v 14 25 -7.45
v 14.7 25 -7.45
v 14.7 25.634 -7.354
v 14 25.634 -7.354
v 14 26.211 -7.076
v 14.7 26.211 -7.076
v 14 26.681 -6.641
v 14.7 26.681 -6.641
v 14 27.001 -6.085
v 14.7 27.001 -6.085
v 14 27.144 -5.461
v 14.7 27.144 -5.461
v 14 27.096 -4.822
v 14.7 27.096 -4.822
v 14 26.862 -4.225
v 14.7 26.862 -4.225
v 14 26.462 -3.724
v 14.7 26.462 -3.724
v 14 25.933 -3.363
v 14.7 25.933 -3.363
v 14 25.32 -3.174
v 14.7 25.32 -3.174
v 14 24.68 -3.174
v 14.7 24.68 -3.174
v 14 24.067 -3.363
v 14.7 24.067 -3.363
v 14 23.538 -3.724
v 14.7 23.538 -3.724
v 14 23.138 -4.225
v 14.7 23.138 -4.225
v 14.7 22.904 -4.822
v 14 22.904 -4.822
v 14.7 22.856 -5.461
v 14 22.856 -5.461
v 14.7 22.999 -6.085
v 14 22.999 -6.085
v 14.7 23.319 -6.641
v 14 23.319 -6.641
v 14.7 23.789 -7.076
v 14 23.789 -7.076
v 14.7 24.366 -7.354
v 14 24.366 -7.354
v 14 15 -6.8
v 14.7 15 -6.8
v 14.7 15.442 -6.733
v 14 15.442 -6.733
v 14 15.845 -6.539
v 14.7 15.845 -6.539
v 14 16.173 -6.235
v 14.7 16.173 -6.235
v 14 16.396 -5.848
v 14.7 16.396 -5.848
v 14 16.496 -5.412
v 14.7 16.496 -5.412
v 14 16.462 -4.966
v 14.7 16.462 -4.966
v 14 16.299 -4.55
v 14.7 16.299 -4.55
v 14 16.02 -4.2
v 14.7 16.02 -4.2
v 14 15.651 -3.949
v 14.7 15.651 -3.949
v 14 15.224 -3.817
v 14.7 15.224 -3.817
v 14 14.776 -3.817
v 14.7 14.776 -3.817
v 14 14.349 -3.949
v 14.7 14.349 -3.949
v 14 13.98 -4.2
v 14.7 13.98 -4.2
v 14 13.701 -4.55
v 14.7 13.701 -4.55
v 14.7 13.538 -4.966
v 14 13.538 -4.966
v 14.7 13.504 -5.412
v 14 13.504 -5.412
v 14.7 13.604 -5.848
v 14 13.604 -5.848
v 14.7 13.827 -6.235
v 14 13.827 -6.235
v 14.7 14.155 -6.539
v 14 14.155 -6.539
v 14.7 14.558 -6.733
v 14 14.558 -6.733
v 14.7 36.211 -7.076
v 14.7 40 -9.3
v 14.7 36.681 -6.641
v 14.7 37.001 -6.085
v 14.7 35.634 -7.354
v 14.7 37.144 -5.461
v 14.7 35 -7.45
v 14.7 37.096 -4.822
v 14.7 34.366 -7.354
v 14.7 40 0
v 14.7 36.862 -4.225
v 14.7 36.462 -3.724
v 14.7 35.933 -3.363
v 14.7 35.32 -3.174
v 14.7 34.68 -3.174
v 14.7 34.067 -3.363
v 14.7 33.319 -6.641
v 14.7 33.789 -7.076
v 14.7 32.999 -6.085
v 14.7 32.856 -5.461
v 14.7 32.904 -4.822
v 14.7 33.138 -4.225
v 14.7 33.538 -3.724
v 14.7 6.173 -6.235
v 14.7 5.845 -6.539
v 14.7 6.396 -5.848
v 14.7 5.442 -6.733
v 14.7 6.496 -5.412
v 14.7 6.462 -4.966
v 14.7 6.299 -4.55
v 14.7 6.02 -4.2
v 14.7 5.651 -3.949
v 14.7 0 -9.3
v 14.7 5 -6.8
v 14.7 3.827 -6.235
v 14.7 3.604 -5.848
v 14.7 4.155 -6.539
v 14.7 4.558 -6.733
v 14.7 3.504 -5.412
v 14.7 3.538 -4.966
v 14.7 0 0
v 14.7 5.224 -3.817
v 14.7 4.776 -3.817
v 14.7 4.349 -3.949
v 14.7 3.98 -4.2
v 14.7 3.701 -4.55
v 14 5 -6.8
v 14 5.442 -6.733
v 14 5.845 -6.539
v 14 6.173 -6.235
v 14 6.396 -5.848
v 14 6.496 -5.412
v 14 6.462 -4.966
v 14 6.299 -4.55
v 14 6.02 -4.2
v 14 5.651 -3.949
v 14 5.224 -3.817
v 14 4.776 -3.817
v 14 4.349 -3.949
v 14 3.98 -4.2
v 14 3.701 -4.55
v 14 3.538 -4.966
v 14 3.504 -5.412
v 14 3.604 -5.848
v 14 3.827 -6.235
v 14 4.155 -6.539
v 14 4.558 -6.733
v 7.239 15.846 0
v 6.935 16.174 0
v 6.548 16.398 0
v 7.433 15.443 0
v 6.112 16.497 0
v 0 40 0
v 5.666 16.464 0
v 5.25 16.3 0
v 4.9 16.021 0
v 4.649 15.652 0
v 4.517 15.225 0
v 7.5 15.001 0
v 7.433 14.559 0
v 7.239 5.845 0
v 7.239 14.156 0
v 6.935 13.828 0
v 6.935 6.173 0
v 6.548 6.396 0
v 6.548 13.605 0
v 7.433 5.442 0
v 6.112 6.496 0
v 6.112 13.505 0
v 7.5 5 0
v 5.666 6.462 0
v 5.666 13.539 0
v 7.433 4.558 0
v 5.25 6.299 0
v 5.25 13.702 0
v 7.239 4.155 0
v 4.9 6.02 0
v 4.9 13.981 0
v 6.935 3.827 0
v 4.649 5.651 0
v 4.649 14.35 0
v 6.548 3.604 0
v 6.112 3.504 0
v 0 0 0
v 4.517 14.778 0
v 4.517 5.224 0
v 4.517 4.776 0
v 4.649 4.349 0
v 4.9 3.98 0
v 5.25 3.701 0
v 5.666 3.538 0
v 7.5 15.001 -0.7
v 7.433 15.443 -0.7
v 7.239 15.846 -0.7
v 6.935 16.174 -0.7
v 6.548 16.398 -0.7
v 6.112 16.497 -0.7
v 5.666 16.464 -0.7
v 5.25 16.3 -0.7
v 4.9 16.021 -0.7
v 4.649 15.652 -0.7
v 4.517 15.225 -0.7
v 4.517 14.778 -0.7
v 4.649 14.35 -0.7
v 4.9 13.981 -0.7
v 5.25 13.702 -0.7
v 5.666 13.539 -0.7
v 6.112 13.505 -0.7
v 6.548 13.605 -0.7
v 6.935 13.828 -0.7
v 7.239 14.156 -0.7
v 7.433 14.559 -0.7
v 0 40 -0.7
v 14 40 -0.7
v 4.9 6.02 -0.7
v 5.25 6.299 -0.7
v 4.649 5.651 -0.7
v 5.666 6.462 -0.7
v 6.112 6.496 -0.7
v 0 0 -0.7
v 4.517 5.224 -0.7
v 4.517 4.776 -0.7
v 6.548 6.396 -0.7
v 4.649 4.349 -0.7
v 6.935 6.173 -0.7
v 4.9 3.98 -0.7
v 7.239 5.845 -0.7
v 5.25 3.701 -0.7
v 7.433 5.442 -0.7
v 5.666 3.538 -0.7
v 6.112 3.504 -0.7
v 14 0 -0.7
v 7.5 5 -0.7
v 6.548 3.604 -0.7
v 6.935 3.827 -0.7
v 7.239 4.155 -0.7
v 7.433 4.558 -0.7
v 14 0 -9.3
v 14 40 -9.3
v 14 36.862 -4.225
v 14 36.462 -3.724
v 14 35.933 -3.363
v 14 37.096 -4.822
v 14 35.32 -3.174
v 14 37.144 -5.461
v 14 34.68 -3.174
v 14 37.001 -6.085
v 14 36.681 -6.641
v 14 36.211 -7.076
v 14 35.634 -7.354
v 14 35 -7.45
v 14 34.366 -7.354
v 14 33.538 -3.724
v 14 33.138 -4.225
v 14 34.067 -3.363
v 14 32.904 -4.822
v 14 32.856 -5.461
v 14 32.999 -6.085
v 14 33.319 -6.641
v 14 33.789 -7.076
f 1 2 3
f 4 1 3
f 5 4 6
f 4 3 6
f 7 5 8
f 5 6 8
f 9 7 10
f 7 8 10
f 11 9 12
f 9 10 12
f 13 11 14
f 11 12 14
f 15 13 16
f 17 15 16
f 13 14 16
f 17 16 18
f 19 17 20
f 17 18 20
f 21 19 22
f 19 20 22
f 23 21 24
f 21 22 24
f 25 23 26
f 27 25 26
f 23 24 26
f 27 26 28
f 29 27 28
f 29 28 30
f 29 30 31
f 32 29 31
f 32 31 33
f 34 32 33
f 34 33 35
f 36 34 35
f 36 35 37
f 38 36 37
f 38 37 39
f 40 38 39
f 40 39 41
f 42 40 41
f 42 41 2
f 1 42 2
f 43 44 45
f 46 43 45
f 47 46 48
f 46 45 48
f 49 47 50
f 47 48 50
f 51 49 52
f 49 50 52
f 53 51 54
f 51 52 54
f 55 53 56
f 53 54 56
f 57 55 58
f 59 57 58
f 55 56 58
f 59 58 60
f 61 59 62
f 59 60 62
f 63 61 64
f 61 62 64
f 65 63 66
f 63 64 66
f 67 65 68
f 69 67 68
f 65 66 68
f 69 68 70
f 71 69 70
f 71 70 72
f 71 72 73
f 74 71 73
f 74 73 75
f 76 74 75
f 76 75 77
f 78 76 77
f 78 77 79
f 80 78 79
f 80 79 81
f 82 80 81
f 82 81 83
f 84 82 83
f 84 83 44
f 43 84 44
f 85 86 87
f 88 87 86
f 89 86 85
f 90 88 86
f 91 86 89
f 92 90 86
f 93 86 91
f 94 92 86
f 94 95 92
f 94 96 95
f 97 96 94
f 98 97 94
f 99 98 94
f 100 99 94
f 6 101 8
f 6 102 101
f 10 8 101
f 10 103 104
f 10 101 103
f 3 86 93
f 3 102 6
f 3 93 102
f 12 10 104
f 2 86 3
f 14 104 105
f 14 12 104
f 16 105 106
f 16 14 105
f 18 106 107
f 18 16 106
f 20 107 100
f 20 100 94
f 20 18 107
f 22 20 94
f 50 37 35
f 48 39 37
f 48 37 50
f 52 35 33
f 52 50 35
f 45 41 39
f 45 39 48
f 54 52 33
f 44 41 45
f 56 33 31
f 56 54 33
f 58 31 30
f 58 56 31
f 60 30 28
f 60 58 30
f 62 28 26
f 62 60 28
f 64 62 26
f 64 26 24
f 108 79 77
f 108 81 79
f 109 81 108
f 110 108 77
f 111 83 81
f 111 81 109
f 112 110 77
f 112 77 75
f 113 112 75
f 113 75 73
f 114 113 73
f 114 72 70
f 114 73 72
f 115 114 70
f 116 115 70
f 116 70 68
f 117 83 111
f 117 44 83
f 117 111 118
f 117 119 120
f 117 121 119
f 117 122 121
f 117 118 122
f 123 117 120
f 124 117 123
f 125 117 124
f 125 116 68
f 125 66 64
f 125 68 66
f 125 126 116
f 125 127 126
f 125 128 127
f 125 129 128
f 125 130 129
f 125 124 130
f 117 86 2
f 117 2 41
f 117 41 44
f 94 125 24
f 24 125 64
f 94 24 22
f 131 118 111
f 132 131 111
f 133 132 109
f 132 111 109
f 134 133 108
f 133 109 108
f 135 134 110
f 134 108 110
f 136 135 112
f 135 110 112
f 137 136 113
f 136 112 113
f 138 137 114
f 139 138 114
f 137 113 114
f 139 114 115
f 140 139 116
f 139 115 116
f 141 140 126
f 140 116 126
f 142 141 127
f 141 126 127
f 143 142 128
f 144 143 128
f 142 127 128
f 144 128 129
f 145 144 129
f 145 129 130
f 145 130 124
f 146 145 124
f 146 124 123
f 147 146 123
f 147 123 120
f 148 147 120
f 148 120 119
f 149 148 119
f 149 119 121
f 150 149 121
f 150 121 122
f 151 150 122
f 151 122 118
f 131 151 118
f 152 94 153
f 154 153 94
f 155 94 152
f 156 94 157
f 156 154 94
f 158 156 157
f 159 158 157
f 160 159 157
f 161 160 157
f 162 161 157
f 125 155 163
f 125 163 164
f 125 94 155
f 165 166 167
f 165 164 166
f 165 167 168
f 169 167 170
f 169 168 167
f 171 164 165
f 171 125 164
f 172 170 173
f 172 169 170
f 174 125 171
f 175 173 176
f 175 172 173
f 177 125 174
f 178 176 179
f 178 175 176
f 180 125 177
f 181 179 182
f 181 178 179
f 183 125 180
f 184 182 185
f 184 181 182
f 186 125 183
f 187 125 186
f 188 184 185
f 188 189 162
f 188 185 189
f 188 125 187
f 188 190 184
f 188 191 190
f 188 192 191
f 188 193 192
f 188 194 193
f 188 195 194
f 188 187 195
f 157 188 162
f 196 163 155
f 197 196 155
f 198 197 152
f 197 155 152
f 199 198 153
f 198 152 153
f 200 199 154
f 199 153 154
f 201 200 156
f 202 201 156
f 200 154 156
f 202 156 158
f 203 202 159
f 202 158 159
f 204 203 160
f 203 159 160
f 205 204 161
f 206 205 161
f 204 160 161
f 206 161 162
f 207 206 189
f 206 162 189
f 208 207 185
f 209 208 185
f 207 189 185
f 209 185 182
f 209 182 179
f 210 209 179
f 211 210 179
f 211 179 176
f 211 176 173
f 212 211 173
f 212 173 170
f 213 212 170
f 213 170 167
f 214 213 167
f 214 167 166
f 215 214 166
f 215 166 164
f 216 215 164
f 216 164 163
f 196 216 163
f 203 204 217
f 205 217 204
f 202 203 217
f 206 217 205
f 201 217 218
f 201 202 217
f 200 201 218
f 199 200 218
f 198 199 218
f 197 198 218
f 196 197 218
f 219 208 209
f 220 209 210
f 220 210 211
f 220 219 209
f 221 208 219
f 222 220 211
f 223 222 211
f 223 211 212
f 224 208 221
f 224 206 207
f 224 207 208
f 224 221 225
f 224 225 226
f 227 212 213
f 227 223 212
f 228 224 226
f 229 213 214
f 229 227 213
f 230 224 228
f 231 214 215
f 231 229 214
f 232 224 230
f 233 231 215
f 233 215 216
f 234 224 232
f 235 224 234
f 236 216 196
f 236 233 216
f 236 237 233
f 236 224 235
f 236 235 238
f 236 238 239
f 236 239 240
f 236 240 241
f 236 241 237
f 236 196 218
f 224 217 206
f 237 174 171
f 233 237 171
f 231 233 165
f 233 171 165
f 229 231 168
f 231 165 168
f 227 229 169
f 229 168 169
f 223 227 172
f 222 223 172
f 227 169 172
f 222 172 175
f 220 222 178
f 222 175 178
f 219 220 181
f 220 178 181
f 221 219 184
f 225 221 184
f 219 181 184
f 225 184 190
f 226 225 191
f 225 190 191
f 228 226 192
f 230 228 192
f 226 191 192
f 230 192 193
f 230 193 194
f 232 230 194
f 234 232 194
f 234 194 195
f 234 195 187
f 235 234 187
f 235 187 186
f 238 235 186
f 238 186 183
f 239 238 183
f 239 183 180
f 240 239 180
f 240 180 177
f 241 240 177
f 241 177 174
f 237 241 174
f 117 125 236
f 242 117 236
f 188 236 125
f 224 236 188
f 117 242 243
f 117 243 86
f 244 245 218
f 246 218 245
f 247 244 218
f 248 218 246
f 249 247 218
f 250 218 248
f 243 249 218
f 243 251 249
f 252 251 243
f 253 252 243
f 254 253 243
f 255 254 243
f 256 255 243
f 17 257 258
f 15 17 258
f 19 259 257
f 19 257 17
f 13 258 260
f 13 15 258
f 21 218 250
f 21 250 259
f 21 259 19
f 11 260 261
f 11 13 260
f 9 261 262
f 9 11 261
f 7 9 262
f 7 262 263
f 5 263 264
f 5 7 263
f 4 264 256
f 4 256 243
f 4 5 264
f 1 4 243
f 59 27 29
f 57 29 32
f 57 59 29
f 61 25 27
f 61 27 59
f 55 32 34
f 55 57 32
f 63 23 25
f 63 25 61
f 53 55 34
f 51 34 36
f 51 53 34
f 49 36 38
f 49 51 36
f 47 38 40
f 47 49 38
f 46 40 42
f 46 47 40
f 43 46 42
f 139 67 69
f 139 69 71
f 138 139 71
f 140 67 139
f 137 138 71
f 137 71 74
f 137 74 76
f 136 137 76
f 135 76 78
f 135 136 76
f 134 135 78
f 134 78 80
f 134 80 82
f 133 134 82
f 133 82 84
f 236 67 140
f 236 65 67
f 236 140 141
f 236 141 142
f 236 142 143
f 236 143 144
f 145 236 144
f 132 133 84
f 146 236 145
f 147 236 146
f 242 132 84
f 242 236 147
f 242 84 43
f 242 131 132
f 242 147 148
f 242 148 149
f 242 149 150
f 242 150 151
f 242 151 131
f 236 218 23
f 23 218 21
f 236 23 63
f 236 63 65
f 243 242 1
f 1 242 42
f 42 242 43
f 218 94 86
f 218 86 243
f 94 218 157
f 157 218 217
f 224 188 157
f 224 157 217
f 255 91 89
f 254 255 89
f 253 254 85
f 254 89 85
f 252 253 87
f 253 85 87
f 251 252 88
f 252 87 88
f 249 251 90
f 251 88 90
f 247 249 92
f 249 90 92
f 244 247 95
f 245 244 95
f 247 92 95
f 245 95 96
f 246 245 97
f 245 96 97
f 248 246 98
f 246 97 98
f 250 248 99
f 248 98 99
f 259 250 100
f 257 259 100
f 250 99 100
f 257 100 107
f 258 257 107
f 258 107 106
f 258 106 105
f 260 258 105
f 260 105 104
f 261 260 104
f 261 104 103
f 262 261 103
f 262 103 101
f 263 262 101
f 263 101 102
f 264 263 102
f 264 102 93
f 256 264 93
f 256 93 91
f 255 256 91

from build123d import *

# Parameters (mm, degrees)
BOSS_EXTRUDE1_DEPTH = 40
SKETCH2_R           = 2.15
SKETCH2_R_2         = 1.5
CUT_EXTRUDE1_DEPTH  = 44.618574025
SKETCH3_R           = 1.5
CUT_EXTRUDE2_DEPTH  = 44.618574025


with BuildPart() as part:
    # Sketch1 → Boss-Extrude1 (new body)
    with BuildSketch(Plane(origin=(0, 0, 0), x_dir=(1, 0, 0), z_dir=(0, 1, 0))):
        Polygon((0, 0), (0, 0.7), (14, 0.7), (14, 9.3), (14.7, 9.3), (14.7, 0), align=None)
    extrude(amount=BOSS_EXTRUDE1_DEPTH)

    # Sketch2 → Cut-Extrude1 (cut, through all)
    with BuildSketch(Plane(origin=(14.7, 0, 0), x_dir=(0, 0, -1), z_dir=(1, 0, 0))):
        with Locations((5.3, 35)):
            Circle(SKETCH2_R)
        with Locations((5.3, 25)):
            Circle(SKETCH2_R)
        with Locations((5.3, 15)):
            Circle(SKETCH2_R_2)
        with Locations((5.3, 5)):
            Circle(SKETCH2_R_2)
    extrude(amount=-CUT_EXTRUDE1_DEPTH, mode=Mode.SUBTRACT)

    # Sketch3 → Cut-Extrude2 (cut, through all)
    with BuildSketch(Plane.XY):
        with Locations((6, 15.001223109)):
            Circle(SKETCH3_R)
        with Locations((6, 5)):
            Circle(SKETCH3_R)
    extrude(amount=-CUT_EXTRUDE2_DEPTH, mode=Mode.SUBTRACT)


solid = part.part
